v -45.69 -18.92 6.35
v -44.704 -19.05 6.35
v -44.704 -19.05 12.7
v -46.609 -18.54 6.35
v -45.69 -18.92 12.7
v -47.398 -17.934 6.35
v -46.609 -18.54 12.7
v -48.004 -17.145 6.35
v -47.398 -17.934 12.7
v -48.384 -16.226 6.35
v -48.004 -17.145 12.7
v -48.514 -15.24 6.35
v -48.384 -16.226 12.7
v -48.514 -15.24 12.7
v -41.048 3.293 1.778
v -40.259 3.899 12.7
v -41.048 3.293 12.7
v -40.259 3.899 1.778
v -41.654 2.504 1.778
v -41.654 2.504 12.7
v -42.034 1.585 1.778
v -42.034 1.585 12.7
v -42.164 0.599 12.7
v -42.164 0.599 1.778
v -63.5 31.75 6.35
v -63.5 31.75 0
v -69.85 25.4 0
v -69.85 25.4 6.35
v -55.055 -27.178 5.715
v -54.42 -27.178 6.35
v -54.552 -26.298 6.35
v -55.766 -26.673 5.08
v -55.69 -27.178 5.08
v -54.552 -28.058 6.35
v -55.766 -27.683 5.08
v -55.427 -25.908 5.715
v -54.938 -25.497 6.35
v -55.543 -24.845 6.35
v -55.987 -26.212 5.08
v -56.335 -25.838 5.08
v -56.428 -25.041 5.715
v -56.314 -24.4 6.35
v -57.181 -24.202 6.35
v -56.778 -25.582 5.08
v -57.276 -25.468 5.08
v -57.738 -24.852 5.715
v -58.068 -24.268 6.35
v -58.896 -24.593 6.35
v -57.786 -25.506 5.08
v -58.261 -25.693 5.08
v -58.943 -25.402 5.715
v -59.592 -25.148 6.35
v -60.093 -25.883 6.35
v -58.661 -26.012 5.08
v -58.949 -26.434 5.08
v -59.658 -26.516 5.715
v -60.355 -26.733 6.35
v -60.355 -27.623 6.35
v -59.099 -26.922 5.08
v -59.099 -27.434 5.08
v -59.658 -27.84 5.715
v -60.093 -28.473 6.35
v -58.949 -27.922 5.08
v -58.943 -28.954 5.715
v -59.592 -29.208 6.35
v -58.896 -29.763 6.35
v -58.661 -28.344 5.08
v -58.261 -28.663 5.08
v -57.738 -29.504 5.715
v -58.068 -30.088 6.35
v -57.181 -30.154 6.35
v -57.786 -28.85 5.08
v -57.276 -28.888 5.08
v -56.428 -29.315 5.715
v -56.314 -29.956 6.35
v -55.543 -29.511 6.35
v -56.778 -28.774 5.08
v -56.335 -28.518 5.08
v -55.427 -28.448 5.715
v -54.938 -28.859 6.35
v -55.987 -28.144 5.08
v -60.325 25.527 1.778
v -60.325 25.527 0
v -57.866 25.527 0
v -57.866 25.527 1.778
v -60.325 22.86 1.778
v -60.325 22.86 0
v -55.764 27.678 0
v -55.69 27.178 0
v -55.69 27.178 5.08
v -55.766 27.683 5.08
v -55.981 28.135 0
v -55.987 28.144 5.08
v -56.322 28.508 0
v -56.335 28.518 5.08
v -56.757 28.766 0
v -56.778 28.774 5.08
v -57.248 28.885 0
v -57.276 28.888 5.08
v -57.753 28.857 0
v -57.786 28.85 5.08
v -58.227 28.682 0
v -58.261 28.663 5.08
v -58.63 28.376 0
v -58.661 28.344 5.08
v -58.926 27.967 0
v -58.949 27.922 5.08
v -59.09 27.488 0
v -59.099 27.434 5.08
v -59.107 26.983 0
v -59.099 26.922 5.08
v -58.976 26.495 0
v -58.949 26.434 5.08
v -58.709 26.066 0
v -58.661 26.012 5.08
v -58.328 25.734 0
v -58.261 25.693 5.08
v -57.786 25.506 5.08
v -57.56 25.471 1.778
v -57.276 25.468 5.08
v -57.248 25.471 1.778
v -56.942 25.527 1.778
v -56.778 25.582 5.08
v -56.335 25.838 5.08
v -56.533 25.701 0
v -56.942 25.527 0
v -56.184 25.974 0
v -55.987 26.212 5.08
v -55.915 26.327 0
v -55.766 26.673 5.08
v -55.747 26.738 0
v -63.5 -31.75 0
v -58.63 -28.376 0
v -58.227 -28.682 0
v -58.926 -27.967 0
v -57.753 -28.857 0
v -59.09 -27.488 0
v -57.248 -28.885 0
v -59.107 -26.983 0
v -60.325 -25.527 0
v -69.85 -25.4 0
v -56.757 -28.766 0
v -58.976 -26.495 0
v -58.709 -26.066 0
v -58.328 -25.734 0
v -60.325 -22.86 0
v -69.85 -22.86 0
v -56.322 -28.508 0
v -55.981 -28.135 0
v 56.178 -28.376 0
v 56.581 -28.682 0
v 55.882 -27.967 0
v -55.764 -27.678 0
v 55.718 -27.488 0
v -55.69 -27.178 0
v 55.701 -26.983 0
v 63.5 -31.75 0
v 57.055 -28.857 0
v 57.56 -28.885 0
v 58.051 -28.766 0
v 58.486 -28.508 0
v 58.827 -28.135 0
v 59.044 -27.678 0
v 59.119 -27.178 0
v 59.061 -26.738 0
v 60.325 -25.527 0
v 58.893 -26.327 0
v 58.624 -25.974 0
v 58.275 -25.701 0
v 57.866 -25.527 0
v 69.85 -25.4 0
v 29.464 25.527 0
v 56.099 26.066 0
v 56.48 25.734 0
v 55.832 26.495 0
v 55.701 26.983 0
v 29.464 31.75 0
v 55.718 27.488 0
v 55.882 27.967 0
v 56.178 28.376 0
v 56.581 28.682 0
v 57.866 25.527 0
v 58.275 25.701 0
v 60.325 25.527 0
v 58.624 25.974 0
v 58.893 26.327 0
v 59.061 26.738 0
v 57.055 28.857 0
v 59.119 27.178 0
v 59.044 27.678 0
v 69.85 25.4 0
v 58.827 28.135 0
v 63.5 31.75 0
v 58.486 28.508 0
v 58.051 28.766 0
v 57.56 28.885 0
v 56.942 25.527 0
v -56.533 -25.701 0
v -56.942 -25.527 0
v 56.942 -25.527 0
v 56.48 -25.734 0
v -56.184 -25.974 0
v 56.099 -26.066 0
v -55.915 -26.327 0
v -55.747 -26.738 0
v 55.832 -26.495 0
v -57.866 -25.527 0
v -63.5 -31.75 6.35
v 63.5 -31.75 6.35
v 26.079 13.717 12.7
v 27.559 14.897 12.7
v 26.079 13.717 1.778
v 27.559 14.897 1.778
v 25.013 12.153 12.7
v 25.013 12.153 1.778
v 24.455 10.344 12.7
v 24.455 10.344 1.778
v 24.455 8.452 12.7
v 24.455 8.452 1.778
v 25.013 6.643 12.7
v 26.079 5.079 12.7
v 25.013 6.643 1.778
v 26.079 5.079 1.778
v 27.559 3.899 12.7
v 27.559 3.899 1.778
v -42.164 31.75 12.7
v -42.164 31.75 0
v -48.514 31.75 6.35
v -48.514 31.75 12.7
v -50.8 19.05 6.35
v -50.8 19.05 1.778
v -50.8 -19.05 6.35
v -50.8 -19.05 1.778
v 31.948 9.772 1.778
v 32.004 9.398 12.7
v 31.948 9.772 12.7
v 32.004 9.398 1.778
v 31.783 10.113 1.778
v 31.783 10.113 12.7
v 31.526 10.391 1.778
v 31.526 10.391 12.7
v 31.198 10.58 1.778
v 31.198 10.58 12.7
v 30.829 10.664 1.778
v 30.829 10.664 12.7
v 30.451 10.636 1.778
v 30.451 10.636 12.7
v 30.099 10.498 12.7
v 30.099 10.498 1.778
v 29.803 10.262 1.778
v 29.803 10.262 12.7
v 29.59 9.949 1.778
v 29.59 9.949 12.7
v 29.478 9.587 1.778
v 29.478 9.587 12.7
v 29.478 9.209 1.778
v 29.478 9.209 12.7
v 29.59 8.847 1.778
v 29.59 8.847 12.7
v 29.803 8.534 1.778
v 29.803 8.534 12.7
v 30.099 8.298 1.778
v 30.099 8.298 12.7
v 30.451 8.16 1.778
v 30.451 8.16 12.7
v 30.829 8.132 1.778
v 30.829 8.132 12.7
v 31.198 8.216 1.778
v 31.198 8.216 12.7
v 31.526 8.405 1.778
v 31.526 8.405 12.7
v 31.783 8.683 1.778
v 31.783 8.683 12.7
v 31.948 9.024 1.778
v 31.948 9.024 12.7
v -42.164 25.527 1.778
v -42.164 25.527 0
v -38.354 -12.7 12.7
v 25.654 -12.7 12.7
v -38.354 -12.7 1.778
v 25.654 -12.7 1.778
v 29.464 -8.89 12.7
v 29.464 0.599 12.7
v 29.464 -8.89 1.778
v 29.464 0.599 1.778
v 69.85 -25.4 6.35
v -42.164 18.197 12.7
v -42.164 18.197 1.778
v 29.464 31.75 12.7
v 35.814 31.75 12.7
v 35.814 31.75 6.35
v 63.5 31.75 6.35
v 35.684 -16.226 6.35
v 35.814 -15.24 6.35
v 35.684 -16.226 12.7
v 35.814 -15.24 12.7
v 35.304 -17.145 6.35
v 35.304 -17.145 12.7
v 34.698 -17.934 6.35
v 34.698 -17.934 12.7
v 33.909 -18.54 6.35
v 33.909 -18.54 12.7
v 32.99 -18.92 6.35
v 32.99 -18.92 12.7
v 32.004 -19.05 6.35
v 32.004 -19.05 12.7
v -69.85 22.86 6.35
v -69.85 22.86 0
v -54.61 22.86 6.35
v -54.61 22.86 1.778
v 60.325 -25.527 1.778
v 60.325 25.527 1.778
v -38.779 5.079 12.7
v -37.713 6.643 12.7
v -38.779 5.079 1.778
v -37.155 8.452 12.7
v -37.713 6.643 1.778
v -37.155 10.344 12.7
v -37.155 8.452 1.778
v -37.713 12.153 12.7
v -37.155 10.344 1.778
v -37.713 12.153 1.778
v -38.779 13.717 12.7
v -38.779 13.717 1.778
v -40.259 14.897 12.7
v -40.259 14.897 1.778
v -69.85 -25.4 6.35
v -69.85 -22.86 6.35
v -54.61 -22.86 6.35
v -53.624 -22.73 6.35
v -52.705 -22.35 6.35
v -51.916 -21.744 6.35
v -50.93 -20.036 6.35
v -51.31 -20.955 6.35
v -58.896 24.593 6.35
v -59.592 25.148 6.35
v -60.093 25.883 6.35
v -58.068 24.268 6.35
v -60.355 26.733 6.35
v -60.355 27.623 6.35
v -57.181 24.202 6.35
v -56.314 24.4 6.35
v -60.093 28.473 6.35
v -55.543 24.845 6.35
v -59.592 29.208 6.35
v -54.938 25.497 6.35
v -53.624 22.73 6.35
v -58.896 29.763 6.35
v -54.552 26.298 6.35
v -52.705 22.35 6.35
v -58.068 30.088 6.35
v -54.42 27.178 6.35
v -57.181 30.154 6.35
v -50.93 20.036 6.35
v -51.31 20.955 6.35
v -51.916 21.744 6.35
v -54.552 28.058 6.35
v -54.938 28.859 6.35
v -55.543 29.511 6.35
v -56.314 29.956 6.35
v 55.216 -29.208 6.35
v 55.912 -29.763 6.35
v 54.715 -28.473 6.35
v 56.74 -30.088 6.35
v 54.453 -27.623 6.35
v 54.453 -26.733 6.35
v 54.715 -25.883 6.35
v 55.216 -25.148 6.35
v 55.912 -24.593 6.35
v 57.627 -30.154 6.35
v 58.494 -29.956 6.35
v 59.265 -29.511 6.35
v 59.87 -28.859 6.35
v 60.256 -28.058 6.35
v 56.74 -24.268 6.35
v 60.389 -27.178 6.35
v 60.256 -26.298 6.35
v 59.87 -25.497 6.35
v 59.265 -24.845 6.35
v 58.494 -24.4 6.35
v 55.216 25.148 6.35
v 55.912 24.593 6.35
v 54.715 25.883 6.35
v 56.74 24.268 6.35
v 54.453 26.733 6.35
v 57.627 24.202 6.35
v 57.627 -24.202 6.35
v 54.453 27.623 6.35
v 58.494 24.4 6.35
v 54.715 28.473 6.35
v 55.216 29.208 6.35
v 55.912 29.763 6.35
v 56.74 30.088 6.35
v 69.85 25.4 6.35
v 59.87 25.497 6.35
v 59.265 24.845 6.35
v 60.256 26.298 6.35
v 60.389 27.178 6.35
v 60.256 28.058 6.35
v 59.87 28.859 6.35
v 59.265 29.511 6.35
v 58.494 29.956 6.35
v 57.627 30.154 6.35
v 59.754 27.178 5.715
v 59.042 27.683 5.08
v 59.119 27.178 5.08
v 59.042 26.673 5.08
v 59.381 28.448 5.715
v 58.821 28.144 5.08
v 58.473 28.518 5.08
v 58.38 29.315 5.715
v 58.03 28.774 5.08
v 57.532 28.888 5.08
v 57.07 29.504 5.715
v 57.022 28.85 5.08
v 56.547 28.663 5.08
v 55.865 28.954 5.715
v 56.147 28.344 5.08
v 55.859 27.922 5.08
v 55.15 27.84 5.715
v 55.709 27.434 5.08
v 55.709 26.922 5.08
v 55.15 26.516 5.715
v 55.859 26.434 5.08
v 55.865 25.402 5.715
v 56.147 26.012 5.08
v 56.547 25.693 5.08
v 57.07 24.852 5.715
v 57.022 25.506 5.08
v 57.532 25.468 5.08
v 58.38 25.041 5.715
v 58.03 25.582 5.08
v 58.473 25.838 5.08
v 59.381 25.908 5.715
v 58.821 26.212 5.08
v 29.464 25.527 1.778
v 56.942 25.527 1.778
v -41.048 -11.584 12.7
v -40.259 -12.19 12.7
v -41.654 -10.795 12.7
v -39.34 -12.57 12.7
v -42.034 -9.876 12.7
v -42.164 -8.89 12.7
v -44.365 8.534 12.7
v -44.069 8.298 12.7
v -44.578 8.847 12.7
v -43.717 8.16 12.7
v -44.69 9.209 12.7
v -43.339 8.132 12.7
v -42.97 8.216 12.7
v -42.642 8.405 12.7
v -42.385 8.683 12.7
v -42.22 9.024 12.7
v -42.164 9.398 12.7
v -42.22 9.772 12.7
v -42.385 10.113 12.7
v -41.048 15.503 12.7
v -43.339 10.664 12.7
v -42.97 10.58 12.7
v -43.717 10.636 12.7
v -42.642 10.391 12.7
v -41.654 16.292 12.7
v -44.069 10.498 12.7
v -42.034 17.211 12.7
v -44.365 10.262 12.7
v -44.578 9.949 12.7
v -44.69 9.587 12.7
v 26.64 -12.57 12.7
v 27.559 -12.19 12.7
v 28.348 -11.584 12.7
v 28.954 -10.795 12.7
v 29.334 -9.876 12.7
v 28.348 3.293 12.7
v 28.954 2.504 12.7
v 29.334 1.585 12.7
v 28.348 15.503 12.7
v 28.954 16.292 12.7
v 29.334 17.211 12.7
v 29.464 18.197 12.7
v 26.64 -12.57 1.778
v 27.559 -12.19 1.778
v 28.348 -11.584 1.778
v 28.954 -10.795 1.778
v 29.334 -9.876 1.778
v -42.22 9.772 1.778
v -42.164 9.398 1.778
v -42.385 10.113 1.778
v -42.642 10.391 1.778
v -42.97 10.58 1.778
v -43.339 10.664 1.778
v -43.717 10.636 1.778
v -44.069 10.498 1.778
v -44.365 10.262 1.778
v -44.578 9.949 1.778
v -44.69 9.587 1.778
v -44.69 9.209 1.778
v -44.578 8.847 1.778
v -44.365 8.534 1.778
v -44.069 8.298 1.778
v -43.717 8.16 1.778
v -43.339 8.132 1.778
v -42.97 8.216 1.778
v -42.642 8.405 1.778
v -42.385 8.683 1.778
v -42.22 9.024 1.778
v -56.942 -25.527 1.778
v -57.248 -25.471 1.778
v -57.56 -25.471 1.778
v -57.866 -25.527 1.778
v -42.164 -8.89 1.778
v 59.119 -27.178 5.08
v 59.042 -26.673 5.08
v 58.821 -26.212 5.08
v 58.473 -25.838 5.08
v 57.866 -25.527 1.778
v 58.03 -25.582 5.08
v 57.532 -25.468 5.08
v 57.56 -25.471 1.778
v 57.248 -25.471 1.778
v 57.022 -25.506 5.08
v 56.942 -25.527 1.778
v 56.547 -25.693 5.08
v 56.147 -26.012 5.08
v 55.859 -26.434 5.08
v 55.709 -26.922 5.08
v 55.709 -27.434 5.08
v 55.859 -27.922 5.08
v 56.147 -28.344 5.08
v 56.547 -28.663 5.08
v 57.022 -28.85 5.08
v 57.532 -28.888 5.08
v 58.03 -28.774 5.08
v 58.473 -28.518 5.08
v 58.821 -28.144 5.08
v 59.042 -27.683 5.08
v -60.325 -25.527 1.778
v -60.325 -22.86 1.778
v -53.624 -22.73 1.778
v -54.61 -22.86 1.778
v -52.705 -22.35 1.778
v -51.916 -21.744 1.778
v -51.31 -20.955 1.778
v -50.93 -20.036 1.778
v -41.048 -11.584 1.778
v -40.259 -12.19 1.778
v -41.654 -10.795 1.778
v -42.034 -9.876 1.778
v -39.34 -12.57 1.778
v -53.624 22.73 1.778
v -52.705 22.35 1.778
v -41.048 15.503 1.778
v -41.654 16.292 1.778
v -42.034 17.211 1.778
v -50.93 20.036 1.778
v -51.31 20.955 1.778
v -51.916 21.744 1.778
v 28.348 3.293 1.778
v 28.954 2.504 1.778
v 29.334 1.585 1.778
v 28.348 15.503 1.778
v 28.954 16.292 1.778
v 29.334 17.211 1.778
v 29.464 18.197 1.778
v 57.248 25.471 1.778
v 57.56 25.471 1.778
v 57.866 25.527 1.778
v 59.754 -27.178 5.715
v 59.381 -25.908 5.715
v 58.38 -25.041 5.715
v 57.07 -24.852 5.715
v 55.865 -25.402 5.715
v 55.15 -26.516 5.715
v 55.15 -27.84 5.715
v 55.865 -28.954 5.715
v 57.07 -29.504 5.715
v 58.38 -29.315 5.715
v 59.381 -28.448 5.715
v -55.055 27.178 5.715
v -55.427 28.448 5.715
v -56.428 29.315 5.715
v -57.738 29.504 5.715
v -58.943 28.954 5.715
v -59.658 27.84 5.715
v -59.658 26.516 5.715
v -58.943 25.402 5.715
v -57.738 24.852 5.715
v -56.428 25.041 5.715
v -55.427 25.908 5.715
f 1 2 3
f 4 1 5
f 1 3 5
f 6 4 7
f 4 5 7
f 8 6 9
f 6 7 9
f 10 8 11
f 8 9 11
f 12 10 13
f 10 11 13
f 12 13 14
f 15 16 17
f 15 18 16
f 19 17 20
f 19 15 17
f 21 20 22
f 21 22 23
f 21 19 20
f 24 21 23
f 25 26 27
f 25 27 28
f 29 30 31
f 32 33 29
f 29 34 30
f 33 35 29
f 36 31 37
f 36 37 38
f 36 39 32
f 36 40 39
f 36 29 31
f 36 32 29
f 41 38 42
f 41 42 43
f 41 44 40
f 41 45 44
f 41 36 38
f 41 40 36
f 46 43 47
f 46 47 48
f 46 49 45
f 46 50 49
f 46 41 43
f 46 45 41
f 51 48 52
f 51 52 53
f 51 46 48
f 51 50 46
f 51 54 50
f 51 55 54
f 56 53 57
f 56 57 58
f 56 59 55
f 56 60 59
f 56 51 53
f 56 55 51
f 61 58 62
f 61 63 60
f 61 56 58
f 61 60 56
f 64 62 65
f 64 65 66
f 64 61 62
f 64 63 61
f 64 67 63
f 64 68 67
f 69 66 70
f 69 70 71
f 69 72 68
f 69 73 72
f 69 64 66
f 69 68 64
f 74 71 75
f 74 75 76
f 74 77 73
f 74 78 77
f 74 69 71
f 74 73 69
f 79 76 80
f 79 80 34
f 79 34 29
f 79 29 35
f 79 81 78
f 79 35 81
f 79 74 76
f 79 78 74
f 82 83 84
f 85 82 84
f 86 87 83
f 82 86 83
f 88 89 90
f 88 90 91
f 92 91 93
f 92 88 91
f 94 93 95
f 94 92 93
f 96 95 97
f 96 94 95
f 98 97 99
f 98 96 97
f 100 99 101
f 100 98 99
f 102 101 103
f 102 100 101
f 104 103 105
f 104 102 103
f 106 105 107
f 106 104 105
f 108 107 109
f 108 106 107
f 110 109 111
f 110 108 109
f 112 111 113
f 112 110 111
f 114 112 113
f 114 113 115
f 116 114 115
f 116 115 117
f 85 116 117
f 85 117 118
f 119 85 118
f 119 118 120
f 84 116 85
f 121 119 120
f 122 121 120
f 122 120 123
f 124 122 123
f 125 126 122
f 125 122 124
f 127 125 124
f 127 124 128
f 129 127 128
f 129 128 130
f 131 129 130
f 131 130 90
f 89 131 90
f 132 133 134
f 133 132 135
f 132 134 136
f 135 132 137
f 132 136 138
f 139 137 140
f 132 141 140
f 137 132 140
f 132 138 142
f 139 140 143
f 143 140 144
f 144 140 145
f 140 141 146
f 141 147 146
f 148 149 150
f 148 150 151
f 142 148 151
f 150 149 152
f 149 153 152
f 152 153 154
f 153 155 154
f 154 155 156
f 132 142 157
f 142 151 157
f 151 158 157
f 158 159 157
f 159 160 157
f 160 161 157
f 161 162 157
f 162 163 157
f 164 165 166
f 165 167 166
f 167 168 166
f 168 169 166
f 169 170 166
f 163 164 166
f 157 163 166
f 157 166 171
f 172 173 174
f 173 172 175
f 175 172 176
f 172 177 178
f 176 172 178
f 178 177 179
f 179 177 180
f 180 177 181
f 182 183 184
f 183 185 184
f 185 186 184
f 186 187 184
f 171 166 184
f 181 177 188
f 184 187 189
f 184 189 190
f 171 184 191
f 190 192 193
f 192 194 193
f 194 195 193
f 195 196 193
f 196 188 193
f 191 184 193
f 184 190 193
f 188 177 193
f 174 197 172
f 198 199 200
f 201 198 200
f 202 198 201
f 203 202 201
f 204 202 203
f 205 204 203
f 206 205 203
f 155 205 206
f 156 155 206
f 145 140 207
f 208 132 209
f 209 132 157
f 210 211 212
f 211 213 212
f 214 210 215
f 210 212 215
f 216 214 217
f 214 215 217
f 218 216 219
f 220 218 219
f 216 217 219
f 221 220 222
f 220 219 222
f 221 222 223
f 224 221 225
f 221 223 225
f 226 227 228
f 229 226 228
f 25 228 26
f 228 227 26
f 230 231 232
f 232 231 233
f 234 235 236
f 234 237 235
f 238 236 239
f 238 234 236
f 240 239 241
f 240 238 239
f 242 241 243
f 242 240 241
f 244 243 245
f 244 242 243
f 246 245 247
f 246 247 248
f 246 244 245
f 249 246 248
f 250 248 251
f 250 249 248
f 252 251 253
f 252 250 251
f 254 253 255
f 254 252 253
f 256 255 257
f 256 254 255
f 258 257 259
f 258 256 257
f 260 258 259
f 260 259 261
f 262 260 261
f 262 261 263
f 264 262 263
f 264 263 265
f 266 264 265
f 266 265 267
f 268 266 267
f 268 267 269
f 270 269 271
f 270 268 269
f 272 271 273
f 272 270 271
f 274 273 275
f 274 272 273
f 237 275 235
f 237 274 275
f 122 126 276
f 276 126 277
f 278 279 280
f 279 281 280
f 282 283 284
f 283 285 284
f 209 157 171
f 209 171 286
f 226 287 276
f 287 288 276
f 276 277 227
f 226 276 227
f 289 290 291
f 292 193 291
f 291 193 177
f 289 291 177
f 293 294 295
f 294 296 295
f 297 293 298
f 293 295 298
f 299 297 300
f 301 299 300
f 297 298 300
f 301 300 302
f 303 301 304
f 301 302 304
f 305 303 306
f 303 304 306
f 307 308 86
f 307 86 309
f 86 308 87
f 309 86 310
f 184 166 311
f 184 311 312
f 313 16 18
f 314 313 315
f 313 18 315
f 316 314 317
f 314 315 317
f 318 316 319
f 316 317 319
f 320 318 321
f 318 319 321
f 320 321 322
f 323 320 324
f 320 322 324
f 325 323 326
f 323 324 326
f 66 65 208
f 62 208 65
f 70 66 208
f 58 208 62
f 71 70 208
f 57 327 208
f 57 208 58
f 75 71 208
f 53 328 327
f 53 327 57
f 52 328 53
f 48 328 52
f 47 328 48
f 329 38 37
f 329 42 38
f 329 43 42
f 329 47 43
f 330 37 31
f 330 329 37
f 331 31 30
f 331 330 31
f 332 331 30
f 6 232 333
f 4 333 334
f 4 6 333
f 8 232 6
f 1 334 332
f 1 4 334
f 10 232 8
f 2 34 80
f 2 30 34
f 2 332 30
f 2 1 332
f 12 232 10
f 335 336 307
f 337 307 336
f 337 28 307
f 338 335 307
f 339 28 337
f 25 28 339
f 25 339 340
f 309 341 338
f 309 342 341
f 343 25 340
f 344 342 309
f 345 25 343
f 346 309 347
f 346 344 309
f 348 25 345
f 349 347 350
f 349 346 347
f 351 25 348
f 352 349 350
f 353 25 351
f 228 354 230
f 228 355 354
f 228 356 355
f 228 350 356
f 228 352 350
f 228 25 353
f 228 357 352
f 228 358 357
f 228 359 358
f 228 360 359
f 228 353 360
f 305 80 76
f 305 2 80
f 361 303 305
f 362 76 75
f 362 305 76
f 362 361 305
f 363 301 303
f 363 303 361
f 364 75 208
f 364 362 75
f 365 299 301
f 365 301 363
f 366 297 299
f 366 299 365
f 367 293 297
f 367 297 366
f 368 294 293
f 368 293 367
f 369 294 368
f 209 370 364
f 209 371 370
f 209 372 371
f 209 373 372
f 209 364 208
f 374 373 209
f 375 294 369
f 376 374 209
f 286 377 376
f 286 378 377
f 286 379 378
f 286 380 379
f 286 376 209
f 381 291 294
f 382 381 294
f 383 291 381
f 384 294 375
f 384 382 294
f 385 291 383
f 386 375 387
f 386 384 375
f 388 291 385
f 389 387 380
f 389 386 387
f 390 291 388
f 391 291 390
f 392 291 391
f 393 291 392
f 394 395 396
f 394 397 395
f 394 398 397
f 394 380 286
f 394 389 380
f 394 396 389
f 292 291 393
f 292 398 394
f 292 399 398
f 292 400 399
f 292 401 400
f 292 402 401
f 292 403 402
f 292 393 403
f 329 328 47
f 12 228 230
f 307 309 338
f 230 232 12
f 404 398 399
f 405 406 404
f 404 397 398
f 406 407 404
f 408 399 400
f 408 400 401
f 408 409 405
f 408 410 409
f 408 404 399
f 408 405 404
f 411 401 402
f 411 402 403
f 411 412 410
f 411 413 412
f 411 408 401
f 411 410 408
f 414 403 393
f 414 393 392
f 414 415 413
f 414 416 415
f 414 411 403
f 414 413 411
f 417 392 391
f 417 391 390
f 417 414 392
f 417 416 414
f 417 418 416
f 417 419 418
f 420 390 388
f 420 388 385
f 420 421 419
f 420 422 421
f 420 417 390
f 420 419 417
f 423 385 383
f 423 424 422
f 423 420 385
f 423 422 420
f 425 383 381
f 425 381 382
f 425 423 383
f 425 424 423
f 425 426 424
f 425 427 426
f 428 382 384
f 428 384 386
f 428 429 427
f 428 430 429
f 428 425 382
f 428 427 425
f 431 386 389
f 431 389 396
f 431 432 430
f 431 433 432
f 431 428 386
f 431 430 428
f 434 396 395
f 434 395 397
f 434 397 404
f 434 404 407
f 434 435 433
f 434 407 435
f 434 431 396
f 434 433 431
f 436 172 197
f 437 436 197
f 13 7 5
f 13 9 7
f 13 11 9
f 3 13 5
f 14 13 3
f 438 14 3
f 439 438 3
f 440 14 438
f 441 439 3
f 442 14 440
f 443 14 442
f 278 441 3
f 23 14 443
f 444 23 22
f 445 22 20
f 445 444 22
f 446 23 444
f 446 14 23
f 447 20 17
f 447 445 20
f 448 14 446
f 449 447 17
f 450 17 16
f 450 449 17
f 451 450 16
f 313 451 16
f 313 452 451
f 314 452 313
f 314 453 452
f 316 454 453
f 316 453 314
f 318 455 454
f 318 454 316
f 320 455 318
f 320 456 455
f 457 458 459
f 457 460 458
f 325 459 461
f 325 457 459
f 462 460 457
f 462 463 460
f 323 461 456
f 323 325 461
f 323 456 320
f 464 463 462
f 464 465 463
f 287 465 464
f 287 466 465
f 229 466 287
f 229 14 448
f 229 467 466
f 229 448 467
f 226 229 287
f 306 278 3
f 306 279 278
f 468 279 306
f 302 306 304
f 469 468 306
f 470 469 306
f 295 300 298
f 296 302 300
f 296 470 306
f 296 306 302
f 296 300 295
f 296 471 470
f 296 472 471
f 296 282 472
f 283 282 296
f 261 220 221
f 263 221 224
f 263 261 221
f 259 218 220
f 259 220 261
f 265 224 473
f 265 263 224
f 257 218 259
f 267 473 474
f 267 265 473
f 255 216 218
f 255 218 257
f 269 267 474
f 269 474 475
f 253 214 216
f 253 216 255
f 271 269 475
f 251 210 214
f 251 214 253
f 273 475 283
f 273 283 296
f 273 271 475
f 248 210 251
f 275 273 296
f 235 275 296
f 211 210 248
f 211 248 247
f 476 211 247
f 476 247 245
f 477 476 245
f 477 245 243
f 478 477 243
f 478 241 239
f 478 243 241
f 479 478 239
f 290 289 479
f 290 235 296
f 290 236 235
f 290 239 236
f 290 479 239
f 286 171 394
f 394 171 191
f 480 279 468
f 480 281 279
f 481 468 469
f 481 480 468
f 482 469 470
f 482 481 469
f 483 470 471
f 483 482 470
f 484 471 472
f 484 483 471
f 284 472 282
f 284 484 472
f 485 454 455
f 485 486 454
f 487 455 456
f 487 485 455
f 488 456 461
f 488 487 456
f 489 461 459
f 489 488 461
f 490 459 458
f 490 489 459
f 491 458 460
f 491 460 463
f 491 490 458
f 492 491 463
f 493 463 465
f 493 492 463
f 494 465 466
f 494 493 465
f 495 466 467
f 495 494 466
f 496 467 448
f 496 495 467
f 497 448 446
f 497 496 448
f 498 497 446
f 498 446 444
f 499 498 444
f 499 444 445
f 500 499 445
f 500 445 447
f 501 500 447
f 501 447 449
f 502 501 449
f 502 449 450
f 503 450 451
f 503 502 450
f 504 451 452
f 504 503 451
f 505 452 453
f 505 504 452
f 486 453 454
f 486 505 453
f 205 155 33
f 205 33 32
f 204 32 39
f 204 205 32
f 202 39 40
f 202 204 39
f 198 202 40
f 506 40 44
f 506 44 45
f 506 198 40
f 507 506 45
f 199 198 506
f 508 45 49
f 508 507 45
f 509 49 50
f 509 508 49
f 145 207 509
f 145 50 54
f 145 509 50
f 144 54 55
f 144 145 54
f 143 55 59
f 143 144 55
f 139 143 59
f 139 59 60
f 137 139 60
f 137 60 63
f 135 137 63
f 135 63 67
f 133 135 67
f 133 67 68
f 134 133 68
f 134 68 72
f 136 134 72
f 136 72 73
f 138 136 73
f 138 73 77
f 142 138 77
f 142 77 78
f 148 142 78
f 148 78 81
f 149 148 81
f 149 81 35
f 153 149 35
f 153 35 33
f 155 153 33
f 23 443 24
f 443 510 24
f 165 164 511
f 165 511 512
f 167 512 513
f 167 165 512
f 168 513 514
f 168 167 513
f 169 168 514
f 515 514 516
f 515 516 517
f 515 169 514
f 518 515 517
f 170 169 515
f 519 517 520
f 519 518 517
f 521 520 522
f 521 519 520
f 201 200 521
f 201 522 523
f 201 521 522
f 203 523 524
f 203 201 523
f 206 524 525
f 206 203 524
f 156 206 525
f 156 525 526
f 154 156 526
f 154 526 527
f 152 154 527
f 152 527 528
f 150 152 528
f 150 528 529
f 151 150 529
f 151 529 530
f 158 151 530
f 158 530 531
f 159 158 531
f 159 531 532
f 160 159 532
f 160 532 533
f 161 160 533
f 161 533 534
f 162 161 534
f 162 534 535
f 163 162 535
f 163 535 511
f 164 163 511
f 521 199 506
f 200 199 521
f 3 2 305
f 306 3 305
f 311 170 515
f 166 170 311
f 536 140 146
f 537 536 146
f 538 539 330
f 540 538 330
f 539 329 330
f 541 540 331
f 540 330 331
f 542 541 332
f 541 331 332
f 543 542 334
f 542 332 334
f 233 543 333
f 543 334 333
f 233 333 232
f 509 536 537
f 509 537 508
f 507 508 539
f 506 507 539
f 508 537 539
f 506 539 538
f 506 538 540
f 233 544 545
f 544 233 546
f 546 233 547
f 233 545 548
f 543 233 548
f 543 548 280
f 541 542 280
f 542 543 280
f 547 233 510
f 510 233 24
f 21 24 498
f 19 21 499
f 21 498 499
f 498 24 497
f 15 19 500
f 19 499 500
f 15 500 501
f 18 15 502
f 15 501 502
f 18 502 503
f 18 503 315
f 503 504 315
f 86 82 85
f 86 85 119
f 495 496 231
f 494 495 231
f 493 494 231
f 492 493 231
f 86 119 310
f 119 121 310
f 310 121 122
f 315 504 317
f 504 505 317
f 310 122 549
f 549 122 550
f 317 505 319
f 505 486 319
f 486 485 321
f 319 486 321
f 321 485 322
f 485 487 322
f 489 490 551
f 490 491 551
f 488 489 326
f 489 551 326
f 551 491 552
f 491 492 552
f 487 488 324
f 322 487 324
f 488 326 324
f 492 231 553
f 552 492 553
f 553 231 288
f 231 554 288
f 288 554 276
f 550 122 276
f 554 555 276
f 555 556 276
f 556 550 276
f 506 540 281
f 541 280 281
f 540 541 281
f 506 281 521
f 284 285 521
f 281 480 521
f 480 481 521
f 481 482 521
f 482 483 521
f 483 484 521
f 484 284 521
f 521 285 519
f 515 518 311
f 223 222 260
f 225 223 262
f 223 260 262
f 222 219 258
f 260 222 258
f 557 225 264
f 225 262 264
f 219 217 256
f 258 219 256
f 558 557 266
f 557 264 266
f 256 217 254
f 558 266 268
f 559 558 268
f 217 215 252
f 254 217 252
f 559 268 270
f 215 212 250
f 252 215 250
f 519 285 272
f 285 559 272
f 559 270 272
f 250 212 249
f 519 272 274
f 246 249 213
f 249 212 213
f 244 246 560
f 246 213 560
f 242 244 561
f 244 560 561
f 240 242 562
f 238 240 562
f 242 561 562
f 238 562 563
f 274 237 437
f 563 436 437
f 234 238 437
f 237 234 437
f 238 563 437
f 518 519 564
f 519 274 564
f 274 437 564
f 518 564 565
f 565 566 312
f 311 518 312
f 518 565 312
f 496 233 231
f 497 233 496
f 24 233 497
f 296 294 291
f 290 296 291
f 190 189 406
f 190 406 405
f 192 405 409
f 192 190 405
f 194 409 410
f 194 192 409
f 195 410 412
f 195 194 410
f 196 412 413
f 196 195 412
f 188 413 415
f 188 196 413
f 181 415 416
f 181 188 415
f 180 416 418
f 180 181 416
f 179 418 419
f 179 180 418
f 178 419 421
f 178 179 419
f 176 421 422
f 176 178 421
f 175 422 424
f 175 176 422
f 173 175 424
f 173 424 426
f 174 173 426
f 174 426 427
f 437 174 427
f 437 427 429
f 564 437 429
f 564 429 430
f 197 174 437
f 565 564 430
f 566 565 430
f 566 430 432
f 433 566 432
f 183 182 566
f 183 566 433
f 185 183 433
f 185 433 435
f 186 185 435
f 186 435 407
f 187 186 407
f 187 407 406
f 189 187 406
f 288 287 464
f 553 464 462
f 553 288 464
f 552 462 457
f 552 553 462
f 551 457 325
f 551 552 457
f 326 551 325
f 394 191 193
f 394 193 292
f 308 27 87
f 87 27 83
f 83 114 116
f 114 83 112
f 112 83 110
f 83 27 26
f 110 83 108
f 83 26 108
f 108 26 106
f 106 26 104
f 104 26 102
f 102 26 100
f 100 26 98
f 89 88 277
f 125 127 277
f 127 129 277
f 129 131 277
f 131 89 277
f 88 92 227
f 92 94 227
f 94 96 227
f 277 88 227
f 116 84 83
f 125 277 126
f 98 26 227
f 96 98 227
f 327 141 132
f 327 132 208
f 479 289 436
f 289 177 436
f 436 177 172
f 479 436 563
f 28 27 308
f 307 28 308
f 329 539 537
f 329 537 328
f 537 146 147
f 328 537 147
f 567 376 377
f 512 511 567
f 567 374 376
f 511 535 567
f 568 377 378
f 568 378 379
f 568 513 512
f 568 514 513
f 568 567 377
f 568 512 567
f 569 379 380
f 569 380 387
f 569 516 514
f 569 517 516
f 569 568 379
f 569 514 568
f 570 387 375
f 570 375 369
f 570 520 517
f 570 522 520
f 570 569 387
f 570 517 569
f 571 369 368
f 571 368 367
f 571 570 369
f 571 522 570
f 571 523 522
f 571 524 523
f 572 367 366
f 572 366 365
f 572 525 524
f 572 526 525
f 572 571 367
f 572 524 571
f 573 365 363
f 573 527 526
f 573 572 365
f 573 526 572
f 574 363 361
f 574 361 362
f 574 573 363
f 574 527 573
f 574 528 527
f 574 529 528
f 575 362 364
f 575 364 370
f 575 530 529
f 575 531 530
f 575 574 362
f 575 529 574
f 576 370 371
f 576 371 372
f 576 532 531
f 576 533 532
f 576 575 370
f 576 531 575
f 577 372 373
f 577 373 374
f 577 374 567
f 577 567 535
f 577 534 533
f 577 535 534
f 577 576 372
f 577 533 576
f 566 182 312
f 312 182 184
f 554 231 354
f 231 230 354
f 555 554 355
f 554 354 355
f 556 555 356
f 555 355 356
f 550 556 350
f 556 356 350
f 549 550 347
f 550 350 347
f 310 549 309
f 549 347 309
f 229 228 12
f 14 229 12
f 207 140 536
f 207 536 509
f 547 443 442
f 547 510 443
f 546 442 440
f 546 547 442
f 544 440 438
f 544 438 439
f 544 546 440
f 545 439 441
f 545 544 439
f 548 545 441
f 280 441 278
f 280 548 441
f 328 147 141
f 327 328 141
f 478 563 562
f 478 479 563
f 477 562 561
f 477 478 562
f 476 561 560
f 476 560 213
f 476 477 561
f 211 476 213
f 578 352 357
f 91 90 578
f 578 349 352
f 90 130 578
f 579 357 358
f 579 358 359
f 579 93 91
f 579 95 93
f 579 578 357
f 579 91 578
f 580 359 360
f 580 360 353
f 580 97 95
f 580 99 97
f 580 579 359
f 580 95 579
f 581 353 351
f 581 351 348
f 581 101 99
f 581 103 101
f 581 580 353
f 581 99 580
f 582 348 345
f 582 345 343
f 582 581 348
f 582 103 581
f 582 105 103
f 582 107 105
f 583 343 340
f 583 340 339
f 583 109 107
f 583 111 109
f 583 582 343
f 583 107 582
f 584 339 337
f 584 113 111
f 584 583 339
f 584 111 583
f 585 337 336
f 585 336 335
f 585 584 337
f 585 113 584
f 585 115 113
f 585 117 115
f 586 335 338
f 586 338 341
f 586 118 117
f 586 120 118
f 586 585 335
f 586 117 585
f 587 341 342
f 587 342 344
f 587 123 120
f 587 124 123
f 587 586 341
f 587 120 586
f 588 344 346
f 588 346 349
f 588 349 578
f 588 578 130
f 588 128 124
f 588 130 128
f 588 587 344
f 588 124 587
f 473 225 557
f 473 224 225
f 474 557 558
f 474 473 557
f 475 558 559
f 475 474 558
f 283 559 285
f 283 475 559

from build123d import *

# Parameters (mm, degrees)
F0_R     = 1.7145
F0_R_2   = 1.27
F1_DEPTH = 6.35
F2_W     = 120.65
F2_H     = 51.054
F3_DEPTH = 1.778
F4_R     = 1.27
F5_DEPTH = 6.35
F6_SIZE  = 6.35
F7_R     = 3.81
F8_SIZE  = 1.27


# Not quite as in the source:
# - a feature names something its author has since deleted; it is built from what else it names


with BuildPart() as f1:
    # F0 (on Top) → F1 (new body)
    with BuildSketch(Plane.XY):
        with BuildLine():
            Line((69.85, -31.75), (69.85, 31.75))
            Line((69.85, 31.75), (29.464, 31.75))
            Line((29.464, 31.75), (29.464, 15.6197039467))
            ThreePointArc((29.464, 15.6197039467), (24.384, 9.398), (29.464, 3.1762960533))
            Line((29.464, 3.1762960533), (29.464, -12.7))
            Line((29.464, -12.7), (-42.164, -12.7))
            Line((-42.164, -12.7), (-42.164, 3.1762960533))
            ThreePointArc((-42.164, 3.1762960533), (-37.084, 9.398), (-42.164, 15.6197039467))
            Line((-42.164, 15.6197039467), (-42.164, 31.75))
            Line((-42.164, 31.75), (-69.85, 31.75))
            Line((-69.85, 31.75), (-69.85, 22.86))
            Line((-69.85, 22.86), (-50.8, 22.86))
            Line((-50.8, 22.86), (-50.8, -22.86))
            Line((-50.8, -22.86), (-69.85, -22.86))
            Line((-69.85, -22.86), (-69.85, -31.75))
            Line((-69.85, -31.75), (69.85, -31.75))
        make_face()
        with Locations((-57.404, -27.178)):
            Circle(F0_R, mode=Mode.SUBTRACT)
        with Locations((57.404, -27.178)):
            Circle(F0_R, mode=Mode.SUBTRACT)
        with Locations((-43.434, 9.398)):
            Circle(F0_R_2, mode=Mode.SUBTRACT)
        with Locations((-57.404, 27.178)):
            Circle(F0_R, mode=Mode.SUBTRACT)
        with Locations((30.734, 9.398)):
            Circle(F0_R_2, mode=Mode.SUBTRACT)
        with Locations((57.404, 27.178)):
            Circle(F0_R, mode=Mode.SUBTRACT)
    extrude(amount=F1_DEPTH)

    # F2 (on Top) → F3 (cut)
    with BuildSketch(Plane.XY):
        Rectangle(F2_W, F2_H)
    extrude(amount=F3_DEPTH, mode=Mode.SUBTRACT)

    # F4 (on face) → F5 (join)
    with BuildSketch(Plane.XY.offset(6.35)):
        with BuildLine():
            Line((-48.514, 31.75), (-48.514, -19.05))
            Line((-48.514, -19.05), (35.814, -19.05))
            Line((35.814, -19.05), (35.814, 31.75))
            Line((35.814, 31.75), (29.464, 31.75))
            Line((29.464, 31.75), (29.464, 15.6197039467))
            ThreePointArc((29.464, 15.6197039467), (24.384, 9.398), (29.464, 3.1762960533))
            Line((29.464, 3.1762960533), (29.464, -12.7))
            Line((29.464, -12.7), (-42.164, -12.7))
            Line((-42.164, -12.7), (-42.164, 3.1762960533))
            ThreePointArc((-42.164, 3.1762960533), (-37.084, 9.398), (-42.164, 15.6197039467))
            Line((-42.164, 15.6197039467), (-42.164, 31.75))
            Line((-42.164, 31.75), (-48.514, 31.75))
        make_face()
        with Locations((-43.434, 9.398)):
            Circle(F4_R, mode=Mode.SUBTRACT)
        with Locations((30.734, 9.398)):
            Circle(F4_R, mode=Mode.SUBTRACT)
    extrude(amount=F5_DEPTH)

    # F6
    f6_edges = [f1.edges().sort_by_distance(p)[0] for p in [
        (-69.85, 31.75, 3.175),
        (69.85, 31.75, 3.175),
        (69.85, -31.75, 3.175),
        (-69.85, -31.75, 3.175),
    ]]
    chamfer(f6_edges, length=F6_SIZE)

    # F7
    f7_edges = [f1.edges().sort_by_distance(p)[0] for p in [
        (-50.8, 22.86, 4.064),
        (-50.8, -22.86, 4.064),
        (29.464, -12.7, 7.239),
        (-42.164, -12.7, 7.239),
        (29.464, 3.176296, 7.239),
        (29.464, 15.619704, 7.239),
        (-42.164, 15.619704, 7.239),
        (-42.164, 3.176296, 7.239),
        (-48.514, -19.05, 9.525),
        (35.814, -19.05, 9.525),
    ]]
    fillet(f7_edges, radius=F7_R)

    # F8
    f8_edges = [f1.edges().sort_by_distance(p)[0] for p in [
        (-59.1185, -27.178, 6.35),
        (-59.1185, 27.178, 6.35),
        (55.6895, 27.178, 6.35),
        (55.6895, -27.178, 6.35),
    ]]
    chamfer(f8_edges, length=F8_SIZE)


solid = f1.part
